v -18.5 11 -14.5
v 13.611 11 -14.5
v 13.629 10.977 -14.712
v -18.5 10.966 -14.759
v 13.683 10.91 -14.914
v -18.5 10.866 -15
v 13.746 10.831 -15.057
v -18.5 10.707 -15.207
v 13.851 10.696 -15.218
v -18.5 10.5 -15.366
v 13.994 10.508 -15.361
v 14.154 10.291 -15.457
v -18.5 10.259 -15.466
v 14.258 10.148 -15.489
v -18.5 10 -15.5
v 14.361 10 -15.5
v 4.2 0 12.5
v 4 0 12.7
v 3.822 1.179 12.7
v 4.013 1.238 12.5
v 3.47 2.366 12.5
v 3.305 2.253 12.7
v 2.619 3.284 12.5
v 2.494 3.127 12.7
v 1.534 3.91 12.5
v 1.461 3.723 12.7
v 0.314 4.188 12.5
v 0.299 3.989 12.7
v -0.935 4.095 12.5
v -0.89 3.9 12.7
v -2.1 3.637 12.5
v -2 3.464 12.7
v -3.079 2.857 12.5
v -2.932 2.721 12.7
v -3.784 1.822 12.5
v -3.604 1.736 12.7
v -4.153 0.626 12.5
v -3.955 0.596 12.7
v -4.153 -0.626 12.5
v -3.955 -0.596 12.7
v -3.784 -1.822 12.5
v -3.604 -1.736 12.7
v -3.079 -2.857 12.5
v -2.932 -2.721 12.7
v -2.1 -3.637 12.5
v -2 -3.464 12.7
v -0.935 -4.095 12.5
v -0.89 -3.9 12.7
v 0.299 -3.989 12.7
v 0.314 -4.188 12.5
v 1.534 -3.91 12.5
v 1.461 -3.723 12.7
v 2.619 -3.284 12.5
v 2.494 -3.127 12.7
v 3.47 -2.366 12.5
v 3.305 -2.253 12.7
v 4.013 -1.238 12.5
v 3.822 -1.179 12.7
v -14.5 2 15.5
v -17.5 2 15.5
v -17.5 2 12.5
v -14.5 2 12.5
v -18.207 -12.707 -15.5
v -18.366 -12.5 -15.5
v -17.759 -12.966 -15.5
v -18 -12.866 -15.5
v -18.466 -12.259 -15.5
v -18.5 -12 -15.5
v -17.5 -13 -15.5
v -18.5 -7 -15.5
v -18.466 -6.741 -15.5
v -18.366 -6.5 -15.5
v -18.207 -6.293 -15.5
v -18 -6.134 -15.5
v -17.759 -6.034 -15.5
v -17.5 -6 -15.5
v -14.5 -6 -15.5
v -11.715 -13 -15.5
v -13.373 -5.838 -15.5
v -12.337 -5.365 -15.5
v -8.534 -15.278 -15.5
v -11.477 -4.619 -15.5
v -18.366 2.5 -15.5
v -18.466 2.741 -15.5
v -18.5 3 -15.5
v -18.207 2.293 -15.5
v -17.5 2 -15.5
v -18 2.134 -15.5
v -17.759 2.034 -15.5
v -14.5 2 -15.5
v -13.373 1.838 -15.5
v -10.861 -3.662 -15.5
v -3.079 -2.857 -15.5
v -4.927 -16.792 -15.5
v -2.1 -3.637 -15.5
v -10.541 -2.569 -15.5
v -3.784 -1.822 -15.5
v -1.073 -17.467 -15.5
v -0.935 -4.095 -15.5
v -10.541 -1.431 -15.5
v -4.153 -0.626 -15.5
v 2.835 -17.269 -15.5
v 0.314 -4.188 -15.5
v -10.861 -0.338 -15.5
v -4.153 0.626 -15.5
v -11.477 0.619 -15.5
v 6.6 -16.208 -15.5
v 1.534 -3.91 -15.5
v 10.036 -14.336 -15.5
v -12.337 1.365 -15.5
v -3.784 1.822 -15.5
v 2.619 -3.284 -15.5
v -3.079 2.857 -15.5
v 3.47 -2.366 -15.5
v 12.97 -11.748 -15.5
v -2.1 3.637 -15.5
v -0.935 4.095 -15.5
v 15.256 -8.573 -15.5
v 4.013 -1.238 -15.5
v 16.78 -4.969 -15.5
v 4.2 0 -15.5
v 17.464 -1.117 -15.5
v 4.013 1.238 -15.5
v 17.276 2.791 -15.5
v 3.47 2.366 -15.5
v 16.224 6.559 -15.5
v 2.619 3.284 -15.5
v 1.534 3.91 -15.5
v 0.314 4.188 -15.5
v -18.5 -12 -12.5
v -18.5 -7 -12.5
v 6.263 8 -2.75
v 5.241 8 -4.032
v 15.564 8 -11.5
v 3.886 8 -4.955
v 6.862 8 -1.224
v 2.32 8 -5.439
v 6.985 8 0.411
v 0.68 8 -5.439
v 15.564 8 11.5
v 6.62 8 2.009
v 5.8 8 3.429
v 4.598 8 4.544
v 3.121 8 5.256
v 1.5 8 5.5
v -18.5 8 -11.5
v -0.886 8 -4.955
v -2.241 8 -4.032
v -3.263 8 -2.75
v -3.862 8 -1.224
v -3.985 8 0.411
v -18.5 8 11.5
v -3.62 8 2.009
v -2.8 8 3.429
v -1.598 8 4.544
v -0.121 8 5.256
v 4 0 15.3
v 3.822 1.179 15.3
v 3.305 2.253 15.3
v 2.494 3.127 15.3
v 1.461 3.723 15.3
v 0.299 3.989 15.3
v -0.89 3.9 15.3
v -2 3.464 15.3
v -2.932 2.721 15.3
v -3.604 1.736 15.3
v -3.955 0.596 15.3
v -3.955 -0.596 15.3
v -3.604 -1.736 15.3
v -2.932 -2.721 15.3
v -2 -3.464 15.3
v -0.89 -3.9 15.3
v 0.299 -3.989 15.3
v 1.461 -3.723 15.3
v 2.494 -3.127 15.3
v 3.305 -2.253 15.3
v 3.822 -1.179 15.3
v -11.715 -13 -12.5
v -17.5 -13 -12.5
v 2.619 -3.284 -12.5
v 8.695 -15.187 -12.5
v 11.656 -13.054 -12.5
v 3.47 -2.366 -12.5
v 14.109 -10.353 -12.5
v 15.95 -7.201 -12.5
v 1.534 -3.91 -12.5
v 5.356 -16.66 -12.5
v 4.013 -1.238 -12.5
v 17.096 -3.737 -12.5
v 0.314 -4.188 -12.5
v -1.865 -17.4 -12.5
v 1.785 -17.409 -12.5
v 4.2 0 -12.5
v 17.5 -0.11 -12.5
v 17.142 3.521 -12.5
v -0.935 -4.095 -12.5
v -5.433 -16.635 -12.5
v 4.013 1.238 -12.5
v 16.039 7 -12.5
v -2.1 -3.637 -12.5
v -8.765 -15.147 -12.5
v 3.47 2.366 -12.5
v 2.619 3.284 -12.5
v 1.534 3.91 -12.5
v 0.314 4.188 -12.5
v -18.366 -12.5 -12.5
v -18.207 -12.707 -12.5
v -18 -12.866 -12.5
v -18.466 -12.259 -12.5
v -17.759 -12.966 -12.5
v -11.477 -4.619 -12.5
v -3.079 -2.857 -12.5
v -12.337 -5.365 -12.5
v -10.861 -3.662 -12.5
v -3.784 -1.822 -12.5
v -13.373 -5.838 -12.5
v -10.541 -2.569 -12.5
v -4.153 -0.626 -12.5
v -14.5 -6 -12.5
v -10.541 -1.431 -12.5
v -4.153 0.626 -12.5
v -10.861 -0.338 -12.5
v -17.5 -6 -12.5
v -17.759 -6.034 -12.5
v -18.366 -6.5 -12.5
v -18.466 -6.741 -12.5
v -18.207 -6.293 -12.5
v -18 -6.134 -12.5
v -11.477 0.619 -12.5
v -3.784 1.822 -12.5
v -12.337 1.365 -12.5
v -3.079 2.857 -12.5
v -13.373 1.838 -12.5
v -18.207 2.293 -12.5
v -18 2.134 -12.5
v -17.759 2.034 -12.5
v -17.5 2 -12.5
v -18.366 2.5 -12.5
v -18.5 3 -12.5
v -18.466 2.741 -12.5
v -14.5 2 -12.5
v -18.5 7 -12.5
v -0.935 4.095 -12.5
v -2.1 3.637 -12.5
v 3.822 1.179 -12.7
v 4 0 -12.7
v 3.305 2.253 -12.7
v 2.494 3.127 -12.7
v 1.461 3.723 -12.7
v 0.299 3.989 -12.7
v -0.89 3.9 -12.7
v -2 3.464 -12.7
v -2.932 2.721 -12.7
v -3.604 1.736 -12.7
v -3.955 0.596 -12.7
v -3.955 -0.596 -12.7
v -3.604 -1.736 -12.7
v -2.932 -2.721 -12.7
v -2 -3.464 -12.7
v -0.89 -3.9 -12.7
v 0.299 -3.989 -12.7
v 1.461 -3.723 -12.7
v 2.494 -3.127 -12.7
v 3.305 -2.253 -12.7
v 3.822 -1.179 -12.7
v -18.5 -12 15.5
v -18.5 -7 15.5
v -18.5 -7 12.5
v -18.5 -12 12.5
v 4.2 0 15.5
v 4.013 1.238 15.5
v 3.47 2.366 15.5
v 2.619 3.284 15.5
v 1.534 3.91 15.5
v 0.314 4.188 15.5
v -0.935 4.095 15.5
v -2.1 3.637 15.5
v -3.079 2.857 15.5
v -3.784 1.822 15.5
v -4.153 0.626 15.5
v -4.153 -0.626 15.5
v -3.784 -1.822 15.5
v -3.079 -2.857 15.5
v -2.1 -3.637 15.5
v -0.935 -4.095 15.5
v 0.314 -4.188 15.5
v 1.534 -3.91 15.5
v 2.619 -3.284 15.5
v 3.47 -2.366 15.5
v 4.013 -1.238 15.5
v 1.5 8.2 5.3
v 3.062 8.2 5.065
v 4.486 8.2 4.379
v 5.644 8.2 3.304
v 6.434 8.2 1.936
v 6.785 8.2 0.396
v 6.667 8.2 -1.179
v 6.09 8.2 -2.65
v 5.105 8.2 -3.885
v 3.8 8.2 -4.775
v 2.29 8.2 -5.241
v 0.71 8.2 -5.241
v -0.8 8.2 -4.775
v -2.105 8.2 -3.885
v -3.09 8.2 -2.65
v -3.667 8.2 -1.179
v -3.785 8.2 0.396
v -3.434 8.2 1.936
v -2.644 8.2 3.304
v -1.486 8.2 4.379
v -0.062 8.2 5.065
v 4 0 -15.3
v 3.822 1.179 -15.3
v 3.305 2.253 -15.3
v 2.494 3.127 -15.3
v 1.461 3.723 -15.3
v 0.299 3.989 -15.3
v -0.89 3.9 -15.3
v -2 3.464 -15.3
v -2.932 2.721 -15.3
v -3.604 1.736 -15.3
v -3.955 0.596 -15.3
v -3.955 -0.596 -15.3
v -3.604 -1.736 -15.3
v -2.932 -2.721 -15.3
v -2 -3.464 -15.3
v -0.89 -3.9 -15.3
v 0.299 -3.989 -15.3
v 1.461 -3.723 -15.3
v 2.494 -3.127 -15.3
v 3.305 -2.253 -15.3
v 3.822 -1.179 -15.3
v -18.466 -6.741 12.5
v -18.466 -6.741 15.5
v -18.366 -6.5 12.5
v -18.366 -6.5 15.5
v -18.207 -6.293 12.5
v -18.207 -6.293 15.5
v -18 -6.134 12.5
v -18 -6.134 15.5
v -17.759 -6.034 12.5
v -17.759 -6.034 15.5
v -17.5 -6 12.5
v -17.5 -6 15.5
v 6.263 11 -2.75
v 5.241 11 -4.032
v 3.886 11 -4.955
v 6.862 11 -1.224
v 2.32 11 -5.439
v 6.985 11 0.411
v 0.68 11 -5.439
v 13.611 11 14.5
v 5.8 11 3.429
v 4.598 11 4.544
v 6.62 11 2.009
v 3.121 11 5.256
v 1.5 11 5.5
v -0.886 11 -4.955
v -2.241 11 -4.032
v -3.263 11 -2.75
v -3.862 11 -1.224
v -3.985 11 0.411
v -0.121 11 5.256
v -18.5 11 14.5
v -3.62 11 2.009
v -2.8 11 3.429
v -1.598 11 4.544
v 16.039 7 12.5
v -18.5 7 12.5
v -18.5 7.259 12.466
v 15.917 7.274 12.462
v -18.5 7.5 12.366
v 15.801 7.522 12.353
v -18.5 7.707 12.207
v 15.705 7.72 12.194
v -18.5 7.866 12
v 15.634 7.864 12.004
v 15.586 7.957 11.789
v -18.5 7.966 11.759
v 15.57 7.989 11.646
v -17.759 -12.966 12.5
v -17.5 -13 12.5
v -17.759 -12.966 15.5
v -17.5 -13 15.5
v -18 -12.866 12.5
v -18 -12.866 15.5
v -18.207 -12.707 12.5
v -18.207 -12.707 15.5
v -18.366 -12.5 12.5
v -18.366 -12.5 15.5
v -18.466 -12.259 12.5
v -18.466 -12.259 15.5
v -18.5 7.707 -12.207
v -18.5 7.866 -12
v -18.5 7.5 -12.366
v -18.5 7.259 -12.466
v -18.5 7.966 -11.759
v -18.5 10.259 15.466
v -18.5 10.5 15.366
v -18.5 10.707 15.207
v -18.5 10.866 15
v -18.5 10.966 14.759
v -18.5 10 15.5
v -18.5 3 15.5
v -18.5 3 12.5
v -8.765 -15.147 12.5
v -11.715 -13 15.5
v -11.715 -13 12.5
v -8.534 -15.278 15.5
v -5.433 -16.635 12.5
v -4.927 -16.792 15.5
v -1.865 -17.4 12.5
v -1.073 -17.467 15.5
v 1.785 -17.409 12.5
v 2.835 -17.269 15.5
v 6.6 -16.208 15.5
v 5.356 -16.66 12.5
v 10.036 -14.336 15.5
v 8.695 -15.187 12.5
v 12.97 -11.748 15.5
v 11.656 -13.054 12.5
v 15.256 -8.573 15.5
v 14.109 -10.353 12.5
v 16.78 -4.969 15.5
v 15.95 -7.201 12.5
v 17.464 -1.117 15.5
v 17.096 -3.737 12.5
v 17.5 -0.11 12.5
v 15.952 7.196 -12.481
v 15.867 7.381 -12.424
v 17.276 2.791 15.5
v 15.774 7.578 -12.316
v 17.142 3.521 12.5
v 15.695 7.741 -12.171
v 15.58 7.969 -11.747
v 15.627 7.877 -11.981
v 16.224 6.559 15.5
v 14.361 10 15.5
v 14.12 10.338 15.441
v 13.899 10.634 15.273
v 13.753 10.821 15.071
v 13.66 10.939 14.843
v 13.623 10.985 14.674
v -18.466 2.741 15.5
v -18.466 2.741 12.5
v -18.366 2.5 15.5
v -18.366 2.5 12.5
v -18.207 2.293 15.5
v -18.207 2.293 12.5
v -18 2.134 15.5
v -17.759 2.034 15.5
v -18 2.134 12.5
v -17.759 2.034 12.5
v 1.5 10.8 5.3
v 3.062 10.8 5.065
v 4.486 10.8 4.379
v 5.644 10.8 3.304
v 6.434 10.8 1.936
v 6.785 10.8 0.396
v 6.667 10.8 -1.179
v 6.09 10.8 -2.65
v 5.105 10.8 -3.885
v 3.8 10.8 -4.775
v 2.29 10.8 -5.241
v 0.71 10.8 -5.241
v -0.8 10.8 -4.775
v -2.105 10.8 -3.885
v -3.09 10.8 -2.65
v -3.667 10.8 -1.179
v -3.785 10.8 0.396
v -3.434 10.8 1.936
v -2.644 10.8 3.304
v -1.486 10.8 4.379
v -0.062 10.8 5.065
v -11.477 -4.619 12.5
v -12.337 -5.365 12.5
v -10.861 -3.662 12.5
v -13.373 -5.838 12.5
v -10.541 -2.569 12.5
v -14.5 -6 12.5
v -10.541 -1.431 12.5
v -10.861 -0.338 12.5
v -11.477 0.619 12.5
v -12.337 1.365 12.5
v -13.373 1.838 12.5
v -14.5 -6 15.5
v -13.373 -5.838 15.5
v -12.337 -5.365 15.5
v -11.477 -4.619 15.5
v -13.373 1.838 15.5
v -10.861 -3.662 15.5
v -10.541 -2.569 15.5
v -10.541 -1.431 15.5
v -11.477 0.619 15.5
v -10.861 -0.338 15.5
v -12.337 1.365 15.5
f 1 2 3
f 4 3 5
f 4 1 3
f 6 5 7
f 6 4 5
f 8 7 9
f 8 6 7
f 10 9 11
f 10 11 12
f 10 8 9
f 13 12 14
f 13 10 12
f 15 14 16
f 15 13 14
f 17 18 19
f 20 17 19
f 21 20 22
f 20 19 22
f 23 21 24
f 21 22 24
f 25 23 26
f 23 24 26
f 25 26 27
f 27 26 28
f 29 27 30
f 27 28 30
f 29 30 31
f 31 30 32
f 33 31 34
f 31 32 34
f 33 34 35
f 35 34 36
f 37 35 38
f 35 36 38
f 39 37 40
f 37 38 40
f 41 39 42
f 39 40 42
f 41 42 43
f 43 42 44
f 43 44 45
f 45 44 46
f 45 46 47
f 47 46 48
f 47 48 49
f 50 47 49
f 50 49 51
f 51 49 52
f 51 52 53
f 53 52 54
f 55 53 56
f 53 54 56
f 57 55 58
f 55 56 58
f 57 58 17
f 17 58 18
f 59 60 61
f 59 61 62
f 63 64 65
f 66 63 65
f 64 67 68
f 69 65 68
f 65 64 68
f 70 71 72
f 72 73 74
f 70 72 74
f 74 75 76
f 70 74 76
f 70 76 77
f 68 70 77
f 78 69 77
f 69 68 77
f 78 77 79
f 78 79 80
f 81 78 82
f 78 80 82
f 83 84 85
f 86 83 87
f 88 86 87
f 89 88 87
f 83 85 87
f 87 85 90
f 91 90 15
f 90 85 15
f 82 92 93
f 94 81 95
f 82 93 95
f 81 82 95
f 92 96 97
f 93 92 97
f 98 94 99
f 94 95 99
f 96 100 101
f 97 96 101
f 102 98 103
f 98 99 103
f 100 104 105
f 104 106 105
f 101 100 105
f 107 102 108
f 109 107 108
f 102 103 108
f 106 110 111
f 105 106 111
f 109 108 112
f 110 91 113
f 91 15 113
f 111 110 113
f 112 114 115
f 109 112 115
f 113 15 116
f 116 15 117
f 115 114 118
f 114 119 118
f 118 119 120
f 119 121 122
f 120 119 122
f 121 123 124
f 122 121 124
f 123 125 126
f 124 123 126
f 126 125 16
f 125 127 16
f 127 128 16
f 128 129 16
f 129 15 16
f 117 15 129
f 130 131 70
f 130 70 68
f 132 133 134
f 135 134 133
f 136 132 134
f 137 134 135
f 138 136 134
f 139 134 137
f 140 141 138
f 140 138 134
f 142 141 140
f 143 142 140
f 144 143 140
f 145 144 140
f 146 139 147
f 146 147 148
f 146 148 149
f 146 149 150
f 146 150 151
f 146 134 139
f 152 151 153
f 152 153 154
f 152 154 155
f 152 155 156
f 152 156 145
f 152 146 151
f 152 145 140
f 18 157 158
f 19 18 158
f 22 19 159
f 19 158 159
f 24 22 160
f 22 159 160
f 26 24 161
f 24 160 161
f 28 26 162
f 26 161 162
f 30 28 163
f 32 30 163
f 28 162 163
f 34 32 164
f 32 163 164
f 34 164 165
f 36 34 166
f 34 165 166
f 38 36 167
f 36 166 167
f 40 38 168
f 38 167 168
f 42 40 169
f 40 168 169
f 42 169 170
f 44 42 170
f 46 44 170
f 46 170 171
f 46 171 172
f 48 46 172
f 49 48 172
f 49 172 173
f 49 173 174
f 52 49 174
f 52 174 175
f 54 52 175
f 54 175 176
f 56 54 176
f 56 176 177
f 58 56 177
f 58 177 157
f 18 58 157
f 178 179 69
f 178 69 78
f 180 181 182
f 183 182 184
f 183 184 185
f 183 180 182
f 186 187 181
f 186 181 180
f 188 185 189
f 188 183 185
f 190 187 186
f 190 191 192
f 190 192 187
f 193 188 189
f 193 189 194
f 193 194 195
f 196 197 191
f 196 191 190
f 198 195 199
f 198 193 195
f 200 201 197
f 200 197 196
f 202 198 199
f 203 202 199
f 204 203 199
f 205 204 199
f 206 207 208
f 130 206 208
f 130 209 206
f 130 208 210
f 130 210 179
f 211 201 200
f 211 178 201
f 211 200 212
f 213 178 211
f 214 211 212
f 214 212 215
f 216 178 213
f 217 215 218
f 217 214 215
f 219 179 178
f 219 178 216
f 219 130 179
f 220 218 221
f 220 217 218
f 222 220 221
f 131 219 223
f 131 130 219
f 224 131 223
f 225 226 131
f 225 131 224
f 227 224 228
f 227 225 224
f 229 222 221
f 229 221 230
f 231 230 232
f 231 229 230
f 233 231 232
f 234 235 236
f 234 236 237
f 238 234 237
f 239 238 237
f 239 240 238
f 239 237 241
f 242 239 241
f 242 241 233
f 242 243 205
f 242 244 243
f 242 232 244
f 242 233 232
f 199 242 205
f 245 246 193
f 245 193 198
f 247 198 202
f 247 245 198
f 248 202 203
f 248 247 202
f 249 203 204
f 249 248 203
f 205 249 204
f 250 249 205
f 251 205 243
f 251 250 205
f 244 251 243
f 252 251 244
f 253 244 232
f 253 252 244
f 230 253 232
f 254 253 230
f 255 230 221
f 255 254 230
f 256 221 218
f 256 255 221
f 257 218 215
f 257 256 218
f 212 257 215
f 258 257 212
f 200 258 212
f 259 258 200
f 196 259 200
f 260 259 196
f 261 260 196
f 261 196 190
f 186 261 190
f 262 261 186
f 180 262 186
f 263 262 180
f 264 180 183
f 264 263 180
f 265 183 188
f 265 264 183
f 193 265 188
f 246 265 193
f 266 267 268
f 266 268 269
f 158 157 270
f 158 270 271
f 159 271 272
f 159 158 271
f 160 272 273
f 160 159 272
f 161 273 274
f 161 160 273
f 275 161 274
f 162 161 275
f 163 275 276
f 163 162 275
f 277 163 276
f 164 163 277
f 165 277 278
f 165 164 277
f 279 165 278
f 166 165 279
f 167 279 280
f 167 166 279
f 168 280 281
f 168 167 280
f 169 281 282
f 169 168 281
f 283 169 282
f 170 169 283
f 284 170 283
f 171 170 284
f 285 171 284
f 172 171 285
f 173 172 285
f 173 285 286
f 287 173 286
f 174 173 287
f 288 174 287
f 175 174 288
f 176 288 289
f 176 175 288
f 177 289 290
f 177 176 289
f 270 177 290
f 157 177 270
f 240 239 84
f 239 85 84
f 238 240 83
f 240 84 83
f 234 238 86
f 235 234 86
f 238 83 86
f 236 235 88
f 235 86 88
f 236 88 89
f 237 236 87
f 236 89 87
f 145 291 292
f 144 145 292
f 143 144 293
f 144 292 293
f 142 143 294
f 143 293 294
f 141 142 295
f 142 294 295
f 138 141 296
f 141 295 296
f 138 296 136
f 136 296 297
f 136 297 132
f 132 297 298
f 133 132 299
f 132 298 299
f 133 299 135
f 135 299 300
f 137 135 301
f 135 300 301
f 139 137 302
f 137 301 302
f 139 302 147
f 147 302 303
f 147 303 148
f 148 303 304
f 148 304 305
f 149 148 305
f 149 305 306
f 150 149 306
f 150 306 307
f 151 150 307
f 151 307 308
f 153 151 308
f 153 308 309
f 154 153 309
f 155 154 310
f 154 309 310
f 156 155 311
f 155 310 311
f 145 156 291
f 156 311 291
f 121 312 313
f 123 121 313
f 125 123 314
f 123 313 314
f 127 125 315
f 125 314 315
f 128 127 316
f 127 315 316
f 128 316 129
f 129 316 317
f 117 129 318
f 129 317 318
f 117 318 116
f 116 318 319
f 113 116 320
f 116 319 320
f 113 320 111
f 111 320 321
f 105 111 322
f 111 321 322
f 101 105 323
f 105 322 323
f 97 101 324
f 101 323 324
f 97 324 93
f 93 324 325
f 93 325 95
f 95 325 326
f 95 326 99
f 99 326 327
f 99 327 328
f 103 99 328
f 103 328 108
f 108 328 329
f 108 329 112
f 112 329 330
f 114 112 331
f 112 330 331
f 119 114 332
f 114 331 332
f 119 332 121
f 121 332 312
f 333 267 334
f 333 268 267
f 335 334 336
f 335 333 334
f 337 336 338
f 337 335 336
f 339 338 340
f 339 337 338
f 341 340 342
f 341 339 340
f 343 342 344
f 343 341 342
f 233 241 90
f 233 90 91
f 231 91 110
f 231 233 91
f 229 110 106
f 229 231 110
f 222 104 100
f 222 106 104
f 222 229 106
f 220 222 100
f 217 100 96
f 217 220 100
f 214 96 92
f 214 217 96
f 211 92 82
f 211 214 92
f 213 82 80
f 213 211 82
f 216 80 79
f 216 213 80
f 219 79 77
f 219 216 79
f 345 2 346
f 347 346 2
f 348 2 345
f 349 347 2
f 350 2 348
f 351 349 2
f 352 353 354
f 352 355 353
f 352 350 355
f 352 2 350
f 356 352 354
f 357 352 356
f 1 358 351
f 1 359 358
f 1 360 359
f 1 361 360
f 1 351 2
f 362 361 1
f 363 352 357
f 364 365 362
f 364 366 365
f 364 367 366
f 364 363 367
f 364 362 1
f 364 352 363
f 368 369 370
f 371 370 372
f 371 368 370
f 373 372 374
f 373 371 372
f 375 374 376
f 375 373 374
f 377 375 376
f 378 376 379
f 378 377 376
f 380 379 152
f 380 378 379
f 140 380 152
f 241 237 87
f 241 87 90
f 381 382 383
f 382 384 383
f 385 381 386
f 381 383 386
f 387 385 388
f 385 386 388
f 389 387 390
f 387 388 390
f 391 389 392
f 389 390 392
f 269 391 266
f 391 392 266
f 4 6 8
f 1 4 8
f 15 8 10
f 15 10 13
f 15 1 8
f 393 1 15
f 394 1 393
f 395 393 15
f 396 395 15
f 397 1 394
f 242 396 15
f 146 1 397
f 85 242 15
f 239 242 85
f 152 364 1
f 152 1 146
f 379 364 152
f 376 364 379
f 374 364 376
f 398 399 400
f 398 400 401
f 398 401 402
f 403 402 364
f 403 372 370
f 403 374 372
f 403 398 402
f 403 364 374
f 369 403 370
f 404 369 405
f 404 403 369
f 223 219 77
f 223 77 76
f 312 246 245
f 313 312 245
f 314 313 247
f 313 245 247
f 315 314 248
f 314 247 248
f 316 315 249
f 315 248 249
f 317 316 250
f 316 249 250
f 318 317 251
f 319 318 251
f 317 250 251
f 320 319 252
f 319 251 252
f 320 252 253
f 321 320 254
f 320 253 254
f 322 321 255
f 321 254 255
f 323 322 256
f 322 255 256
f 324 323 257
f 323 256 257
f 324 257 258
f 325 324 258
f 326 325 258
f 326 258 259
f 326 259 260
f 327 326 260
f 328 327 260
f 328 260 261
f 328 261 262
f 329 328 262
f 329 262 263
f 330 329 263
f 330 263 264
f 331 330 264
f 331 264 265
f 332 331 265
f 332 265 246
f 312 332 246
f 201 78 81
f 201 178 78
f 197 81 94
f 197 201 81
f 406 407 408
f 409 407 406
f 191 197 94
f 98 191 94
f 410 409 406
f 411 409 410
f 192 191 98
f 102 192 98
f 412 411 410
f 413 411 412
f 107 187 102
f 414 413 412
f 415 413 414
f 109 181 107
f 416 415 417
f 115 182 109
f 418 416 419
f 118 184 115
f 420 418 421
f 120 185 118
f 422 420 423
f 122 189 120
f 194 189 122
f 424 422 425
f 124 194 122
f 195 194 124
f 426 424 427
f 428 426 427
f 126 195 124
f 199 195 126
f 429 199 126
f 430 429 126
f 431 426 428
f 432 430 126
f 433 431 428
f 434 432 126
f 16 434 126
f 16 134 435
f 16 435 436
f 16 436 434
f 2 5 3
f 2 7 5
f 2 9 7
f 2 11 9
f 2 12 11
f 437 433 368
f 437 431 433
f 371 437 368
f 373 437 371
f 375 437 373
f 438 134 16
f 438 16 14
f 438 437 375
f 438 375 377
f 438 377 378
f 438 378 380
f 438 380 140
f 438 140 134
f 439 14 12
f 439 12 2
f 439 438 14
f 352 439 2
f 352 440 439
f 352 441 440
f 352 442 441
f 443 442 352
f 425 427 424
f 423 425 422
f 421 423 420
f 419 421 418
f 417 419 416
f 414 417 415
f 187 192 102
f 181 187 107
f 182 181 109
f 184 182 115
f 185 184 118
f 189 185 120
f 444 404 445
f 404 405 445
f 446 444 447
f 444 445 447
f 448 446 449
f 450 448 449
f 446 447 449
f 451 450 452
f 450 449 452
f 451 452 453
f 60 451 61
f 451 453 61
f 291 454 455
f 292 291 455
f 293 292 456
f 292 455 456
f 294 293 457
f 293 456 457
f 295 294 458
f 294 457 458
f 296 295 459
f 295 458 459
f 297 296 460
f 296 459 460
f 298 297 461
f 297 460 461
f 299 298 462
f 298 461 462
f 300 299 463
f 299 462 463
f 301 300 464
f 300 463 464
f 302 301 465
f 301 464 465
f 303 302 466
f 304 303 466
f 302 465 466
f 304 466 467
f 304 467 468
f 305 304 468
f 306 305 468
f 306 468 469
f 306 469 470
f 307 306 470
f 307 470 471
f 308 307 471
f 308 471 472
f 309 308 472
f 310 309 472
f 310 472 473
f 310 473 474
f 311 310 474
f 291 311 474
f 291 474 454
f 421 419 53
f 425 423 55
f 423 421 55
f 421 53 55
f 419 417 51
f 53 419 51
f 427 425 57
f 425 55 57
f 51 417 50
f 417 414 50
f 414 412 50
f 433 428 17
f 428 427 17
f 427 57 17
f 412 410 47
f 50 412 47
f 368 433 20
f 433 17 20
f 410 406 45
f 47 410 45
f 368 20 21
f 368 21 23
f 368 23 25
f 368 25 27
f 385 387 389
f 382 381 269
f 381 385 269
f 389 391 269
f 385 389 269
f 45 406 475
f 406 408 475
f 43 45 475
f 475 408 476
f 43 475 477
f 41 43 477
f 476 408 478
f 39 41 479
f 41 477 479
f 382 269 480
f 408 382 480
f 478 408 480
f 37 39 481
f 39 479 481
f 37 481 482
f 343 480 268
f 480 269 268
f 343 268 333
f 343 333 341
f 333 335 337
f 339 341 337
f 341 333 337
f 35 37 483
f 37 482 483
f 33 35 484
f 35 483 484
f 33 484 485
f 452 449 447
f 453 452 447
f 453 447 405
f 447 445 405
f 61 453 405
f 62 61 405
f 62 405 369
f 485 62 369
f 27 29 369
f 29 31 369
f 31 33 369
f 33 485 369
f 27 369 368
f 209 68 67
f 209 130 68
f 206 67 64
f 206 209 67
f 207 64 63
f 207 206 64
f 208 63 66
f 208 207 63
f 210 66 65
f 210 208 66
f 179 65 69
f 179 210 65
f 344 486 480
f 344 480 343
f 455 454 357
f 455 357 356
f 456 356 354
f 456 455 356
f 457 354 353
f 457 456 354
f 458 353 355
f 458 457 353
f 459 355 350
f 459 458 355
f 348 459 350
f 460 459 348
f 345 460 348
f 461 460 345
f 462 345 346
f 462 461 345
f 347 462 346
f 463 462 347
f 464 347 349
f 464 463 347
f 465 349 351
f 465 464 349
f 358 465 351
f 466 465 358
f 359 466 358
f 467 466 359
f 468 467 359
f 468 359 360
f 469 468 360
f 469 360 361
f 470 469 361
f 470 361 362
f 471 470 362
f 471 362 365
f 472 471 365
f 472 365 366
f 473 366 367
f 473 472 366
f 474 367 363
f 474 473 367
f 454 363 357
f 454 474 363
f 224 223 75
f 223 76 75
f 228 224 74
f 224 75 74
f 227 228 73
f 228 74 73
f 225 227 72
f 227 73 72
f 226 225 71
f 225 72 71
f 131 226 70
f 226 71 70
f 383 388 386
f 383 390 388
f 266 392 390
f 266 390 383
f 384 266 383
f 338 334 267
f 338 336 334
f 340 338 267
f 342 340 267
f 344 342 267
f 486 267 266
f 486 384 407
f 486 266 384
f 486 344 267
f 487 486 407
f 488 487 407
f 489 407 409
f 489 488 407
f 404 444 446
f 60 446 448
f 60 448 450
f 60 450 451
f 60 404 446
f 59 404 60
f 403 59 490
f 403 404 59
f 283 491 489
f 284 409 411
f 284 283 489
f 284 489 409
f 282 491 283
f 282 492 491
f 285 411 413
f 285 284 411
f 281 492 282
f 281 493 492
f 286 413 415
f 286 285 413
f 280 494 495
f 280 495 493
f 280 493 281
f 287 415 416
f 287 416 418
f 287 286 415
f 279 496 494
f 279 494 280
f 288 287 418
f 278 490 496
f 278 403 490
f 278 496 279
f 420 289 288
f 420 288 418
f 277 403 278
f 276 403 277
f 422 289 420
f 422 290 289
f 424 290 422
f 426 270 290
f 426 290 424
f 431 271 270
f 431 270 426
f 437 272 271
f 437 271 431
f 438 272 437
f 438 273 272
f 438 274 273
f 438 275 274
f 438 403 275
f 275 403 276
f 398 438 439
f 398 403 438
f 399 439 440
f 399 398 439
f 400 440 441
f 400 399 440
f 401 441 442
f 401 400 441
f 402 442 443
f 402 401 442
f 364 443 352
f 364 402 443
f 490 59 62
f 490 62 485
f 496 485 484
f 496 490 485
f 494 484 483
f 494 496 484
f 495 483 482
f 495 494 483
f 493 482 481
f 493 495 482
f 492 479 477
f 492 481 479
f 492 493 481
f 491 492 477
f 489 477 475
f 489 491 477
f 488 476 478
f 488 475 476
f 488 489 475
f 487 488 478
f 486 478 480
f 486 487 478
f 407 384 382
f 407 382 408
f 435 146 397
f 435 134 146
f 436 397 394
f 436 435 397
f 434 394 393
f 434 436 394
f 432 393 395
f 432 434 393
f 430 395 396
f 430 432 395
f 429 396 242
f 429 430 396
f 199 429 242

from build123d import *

# Parameters (mm, degrees)
EXTRUDE_1_DEPTH     = 15.5
SKETCH_2_R          = 4
CUT_EXTRUDE_1_DEPTH = 41.118574252
SKETCH_3_W          = 25
SKETCH_3_H          = 25.5
CUT_EXTRUDE_2_DEPTH = 43.924352063
CUT_EXTRUDE_3_REACH = 39.346
SKETCH_4_R          = 5.3
FILLET_1_R          = 1
FILLET_2_R          = 1
CHAMFER_1_SIZE      = 0.2


with BuildPart() as part:
    # ｽｹｯﾁ1 → ﾎﾞｽ - 押し出し1 (new, symmetric)
    with BuildSketch(Plane.XY):
        with BuildLine():
            Line((-18.5, 11), (-18.5, -13))
            Line((-18.5, -13), (-11.715374514, -13))
            ThreePointArc((-11.715374514, -13), (12.037359531, -12.702439747), (13.610657589, 11))
            Line((13.610657589, 11), (-18.5, 11))
        make_face()
    extrude(amount=EXTRUDE_1_DEPTH, both=True)

    # ｽｹｯﾁ2 → ｶｯﾄ - 押し出し1 (cut, through all)
    with BuildSketch(Plane.XY.offset(15.5)):
        Circle(SKETCH_2_R)
        with BuildLine():
            Line((-18.5, 2), (-14.5, 2))
            ThreePointArc((-14.5, 2), (-10.5, -2), (-14.5, -6))
            Line((-14.5, -6), (-18.5, -6))
            Line((-18.5, -6), (-18.5, 2))
        make_face()
    extrude(amount=-CUT_EXTRUDE_1_DEPTH, mode=Mode.SUBTRACT)

    # ｽｹｯﾁ3 → ｶｯﾄ - 押し出し2 (cut, through all)
    with BuildSketch(Plane.ZY.offset(18.5)):
        with Locations((0, -4.75)):
            Rectangle(SKETCH_3_W, SKETCH_3_H)
    extrude(amount=-CUT_EXTRUDE_2_DEPTH, mode=Mode.SUBTRACT)

    # ｽｹｯﾁ4 → ｶｯﾄ - 押し出し3 (cut, up to next)
    with BuildSketch(Plane(origin=(0, 11, 0), x_dir=(1, 0, 0), z_dir=(0, 1, 0)), mode=Mode.PRIVATE) as cut_extrude_3_sk1:
        with Locations(Location((1.5, 0, 0), (0, 0, 270))):
            Circle(SKETCH_4_R)
    cut_extrude_3_tool1 = extrude(cut_extrude_3_sk1.sketch, amount=-CUT_EXTRUDE_3_REACH, mode=Mode.PRIVATE) & part.part
    add(cut_extrude_3_tool1.solids().sort_by_distance((1.5, 11, 0))[0], mode=Mode.SUBTRACT)

    # ﾌｨﾚｯﾄ1
    fillet_1_edges = [part.edges().sort_by_distance(p)[0] for p in [
        (-18.5, -6, -14),
        (-18.5, 2, -14),
        (-18.5, -6, 14),
        (-18.5, 2, 14),
        (-18.5, -13, -14),
        (-18.5, -13, 14),
    ]]
    fillet(fillet_1_edges, radius=FILLET_1_R)

    # ﾌｨﾚｯﾄ2
    fillet_2_edges = [part.edges().sort_by_distance(p)[0] for p in [
        (-2.444671206, 11, 15.5),
        (-1.467808792, 8, -12.5),
        (-1.467808792, 8, 12.5),
        (-2.444671206, 11, -15.5),
    ]]
    fillet(fillet_2_edges, radius=FILLET_2_R)

    # 面取り1
    chamfer_1_edges = [part.edges().sort_by_distance(p)[0] for p in [
        (-4, 0, -15.5),
        (-4, 0, 15.5),
        (-4, 0, -12.5),
        (-4, 0, 12.5),
        (1.5, 11, -5.3),
        (1.5, 8, -5.3),
    ]]
    chamfer(chamfer_1_edges, length=CHAMFER_1_SIZE)


solid = part.part
